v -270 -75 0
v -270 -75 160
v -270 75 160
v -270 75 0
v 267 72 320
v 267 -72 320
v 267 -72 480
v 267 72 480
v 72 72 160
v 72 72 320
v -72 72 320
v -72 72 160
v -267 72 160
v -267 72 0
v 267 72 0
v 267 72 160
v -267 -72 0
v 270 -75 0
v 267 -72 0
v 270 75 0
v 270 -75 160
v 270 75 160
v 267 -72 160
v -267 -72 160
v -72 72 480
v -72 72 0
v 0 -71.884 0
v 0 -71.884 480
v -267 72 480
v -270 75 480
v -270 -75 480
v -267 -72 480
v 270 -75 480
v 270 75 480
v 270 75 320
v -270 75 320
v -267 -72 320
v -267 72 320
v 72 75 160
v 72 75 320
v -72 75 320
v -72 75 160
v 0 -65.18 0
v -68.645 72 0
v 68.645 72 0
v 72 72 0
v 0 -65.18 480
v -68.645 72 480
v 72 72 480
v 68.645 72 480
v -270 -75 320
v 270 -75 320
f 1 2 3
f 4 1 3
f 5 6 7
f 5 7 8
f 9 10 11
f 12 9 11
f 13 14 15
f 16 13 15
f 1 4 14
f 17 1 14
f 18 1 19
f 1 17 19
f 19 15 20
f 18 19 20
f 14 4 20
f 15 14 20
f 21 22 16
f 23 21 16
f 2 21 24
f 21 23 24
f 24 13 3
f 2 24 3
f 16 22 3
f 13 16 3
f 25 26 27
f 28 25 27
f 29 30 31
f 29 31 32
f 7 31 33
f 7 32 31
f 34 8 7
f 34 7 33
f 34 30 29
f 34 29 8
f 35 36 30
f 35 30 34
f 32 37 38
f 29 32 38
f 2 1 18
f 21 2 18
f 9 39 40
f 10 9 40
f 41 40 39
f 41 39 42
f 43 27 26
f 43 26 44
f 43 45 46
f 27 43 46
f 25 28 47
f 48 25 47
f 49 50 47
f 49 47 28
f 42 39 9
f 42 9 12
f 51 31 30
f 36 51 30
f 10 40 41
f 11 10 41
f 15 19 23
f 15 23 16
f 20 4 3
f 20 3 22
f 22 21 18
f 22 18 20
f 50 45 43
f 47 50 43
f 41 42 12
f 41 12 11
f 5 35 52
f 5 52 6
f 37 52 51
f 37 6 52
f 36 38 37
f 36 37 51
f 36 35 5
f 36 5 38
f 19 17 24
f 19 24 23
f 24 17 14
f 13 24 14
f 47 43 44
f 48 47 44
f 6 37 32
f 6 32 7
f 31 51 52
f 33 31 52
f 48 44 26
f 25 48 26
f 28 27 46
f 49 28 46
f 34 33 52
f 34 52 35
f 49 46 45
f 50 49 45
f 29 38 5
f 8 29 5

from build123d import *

# Parameters (mm, degrees)
F0_W     = 540
F0_H     = 150
F0_W_2   = 534
F0_H_2   = 144
F1_DEPTH = 480
F2_W     = 540
F2_H     = 160
F3_DEPTH = 150.001
F5_DEPTH = 480
F6_W     = 144
F6_H     = 160
F7_DEPTH = 3


with BuildPart() as f1:
    # F0 (on Top) → F1 (new body)
    with BuildSketch(Plane.XY):
        Rectangle(F0_W, F0_H)
        Rectangle(F0_W_2, F0_H_2, mode=Mode.SUBTRACT)
    extrude(amount=F1_DEPTH)

    # F2 (on face) → F3 (cut, through all)
    with BuildSketch(Plane(origin=(0, 75, 0), x_dir=(-1, 0, 0), z_dir=(0, 1, 0))):
        with Locations((0, 240)):
            Rectangle(F2_W, F2_H)
    extrude(amount=-F3_DEPTH, mode=Mode.SUBTRACT)


with BuildPart() as f5:
    # F4 (on Top) → F5 (new body)
    with BuildSketch(Plane.XY):
        Polygon((-72, 72), (0, -71.8838125467), (72, 72), (68.6453561654, 72), (0, -65.1799383154), (-68.6453561654, 72), align=None)
    extrude(amount=F5_DEPTH)


with BuildPart() as f7:
    # F6 (on face) → F7 (new body)
    with BuildSketch(Plane(origin=(0, 75, 0), x_dir=(-1, 0, 0), z_dir=(0, 1, 0))):
        with Locations((0, 240)):
            Rectangle(F6_W, F6_H)
    extrude(amount=-F7_DEPTH)


solid = Compound([f1.part, f5.part, f7.part])
